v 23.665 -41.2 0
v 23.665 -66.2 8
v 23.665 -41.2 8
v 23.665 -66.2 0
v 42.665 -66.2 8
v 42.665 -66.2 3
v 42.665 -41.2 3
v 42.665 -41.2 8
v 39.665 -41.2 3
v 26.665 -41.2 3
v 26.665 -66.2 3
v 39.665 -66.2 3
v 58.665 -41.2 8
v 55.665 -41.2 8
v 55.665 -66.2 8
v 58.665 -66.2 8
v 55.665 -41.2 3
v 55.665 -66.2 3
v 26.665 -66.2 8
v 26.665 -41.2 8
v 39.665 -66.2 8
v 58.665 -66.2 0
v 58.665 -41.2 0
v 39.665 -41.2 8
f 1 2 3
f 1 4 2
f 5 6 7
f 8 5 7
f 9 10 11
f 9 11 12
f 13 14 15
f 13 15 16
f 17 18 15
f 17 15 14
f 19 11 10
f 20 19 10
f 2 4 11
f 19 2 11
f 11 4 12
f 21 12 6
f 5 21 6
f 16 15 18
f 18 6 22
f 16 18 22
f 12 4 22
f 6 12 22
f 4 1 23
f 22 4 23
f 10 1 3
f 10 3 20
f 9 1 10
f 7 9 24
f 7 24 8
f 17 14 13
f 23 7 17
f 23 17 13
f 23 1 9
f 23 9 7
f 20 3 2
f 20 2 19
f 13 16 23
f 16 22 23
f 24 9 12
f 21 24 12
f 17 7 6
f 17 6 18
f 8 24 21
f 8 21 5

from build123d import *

# Parameters (mm, degrees)
F0_W     = 35
F0_H     = 25
F1_DEPTH = 3
F2_W     = 1.5
F2_H     = 12.5
F3_DEPTH = 5
F4_W     = 3
F4_H     = 25
F5_DEPTH = 5
F6_W     = 3
F6_H     = 25
F7_DEPTH = 5


with BuildPart() as f1:
    # F0 (on Top) → F1 (new body)
    with BuildSketch(Plane.XY):
        with Locations((41.165313, -53.700294)):
            Rectangle(F0_W, F0_H)
    extrude(amount=F1_DEPTH)

    # F2 (on face) → F3 (join)
    with BuildSketch(Plane.XY.offset(3)):
        with Locations((40.415313, -47.450294)):
            Rectangle(F2_W, F2_H)
        with Locations((40.415313, -59.950294)):
            Rectangle(F2_W, F2_H)
        with Locations((41.915313, -47.450294)):
            Rectangle(F2_W, F2_H)
        with Locations((41.915313, -59.950294)):
            Rectangle(F2_W, F2_H)
    extrude(amount=F3_DEPTH)

    # F4 (on face) → F5 (join)
    with BuildSketch(Plane.XY.offset(3)):
        with Locations((25.165313, -53.700294)):
            Rectangle(F4_W, F4_H)
    extrude(amount=F5_DEPTH)

    # F6 (on face) → F7 (join)
    with BuildSketch(Plane.XY.offset(3)):
        with Locations((57.165313, -53.700294)):
            Rectangle(F6_W, F6_H)
    extrude(amount=F7_DEPTH)


solid = f1.part
